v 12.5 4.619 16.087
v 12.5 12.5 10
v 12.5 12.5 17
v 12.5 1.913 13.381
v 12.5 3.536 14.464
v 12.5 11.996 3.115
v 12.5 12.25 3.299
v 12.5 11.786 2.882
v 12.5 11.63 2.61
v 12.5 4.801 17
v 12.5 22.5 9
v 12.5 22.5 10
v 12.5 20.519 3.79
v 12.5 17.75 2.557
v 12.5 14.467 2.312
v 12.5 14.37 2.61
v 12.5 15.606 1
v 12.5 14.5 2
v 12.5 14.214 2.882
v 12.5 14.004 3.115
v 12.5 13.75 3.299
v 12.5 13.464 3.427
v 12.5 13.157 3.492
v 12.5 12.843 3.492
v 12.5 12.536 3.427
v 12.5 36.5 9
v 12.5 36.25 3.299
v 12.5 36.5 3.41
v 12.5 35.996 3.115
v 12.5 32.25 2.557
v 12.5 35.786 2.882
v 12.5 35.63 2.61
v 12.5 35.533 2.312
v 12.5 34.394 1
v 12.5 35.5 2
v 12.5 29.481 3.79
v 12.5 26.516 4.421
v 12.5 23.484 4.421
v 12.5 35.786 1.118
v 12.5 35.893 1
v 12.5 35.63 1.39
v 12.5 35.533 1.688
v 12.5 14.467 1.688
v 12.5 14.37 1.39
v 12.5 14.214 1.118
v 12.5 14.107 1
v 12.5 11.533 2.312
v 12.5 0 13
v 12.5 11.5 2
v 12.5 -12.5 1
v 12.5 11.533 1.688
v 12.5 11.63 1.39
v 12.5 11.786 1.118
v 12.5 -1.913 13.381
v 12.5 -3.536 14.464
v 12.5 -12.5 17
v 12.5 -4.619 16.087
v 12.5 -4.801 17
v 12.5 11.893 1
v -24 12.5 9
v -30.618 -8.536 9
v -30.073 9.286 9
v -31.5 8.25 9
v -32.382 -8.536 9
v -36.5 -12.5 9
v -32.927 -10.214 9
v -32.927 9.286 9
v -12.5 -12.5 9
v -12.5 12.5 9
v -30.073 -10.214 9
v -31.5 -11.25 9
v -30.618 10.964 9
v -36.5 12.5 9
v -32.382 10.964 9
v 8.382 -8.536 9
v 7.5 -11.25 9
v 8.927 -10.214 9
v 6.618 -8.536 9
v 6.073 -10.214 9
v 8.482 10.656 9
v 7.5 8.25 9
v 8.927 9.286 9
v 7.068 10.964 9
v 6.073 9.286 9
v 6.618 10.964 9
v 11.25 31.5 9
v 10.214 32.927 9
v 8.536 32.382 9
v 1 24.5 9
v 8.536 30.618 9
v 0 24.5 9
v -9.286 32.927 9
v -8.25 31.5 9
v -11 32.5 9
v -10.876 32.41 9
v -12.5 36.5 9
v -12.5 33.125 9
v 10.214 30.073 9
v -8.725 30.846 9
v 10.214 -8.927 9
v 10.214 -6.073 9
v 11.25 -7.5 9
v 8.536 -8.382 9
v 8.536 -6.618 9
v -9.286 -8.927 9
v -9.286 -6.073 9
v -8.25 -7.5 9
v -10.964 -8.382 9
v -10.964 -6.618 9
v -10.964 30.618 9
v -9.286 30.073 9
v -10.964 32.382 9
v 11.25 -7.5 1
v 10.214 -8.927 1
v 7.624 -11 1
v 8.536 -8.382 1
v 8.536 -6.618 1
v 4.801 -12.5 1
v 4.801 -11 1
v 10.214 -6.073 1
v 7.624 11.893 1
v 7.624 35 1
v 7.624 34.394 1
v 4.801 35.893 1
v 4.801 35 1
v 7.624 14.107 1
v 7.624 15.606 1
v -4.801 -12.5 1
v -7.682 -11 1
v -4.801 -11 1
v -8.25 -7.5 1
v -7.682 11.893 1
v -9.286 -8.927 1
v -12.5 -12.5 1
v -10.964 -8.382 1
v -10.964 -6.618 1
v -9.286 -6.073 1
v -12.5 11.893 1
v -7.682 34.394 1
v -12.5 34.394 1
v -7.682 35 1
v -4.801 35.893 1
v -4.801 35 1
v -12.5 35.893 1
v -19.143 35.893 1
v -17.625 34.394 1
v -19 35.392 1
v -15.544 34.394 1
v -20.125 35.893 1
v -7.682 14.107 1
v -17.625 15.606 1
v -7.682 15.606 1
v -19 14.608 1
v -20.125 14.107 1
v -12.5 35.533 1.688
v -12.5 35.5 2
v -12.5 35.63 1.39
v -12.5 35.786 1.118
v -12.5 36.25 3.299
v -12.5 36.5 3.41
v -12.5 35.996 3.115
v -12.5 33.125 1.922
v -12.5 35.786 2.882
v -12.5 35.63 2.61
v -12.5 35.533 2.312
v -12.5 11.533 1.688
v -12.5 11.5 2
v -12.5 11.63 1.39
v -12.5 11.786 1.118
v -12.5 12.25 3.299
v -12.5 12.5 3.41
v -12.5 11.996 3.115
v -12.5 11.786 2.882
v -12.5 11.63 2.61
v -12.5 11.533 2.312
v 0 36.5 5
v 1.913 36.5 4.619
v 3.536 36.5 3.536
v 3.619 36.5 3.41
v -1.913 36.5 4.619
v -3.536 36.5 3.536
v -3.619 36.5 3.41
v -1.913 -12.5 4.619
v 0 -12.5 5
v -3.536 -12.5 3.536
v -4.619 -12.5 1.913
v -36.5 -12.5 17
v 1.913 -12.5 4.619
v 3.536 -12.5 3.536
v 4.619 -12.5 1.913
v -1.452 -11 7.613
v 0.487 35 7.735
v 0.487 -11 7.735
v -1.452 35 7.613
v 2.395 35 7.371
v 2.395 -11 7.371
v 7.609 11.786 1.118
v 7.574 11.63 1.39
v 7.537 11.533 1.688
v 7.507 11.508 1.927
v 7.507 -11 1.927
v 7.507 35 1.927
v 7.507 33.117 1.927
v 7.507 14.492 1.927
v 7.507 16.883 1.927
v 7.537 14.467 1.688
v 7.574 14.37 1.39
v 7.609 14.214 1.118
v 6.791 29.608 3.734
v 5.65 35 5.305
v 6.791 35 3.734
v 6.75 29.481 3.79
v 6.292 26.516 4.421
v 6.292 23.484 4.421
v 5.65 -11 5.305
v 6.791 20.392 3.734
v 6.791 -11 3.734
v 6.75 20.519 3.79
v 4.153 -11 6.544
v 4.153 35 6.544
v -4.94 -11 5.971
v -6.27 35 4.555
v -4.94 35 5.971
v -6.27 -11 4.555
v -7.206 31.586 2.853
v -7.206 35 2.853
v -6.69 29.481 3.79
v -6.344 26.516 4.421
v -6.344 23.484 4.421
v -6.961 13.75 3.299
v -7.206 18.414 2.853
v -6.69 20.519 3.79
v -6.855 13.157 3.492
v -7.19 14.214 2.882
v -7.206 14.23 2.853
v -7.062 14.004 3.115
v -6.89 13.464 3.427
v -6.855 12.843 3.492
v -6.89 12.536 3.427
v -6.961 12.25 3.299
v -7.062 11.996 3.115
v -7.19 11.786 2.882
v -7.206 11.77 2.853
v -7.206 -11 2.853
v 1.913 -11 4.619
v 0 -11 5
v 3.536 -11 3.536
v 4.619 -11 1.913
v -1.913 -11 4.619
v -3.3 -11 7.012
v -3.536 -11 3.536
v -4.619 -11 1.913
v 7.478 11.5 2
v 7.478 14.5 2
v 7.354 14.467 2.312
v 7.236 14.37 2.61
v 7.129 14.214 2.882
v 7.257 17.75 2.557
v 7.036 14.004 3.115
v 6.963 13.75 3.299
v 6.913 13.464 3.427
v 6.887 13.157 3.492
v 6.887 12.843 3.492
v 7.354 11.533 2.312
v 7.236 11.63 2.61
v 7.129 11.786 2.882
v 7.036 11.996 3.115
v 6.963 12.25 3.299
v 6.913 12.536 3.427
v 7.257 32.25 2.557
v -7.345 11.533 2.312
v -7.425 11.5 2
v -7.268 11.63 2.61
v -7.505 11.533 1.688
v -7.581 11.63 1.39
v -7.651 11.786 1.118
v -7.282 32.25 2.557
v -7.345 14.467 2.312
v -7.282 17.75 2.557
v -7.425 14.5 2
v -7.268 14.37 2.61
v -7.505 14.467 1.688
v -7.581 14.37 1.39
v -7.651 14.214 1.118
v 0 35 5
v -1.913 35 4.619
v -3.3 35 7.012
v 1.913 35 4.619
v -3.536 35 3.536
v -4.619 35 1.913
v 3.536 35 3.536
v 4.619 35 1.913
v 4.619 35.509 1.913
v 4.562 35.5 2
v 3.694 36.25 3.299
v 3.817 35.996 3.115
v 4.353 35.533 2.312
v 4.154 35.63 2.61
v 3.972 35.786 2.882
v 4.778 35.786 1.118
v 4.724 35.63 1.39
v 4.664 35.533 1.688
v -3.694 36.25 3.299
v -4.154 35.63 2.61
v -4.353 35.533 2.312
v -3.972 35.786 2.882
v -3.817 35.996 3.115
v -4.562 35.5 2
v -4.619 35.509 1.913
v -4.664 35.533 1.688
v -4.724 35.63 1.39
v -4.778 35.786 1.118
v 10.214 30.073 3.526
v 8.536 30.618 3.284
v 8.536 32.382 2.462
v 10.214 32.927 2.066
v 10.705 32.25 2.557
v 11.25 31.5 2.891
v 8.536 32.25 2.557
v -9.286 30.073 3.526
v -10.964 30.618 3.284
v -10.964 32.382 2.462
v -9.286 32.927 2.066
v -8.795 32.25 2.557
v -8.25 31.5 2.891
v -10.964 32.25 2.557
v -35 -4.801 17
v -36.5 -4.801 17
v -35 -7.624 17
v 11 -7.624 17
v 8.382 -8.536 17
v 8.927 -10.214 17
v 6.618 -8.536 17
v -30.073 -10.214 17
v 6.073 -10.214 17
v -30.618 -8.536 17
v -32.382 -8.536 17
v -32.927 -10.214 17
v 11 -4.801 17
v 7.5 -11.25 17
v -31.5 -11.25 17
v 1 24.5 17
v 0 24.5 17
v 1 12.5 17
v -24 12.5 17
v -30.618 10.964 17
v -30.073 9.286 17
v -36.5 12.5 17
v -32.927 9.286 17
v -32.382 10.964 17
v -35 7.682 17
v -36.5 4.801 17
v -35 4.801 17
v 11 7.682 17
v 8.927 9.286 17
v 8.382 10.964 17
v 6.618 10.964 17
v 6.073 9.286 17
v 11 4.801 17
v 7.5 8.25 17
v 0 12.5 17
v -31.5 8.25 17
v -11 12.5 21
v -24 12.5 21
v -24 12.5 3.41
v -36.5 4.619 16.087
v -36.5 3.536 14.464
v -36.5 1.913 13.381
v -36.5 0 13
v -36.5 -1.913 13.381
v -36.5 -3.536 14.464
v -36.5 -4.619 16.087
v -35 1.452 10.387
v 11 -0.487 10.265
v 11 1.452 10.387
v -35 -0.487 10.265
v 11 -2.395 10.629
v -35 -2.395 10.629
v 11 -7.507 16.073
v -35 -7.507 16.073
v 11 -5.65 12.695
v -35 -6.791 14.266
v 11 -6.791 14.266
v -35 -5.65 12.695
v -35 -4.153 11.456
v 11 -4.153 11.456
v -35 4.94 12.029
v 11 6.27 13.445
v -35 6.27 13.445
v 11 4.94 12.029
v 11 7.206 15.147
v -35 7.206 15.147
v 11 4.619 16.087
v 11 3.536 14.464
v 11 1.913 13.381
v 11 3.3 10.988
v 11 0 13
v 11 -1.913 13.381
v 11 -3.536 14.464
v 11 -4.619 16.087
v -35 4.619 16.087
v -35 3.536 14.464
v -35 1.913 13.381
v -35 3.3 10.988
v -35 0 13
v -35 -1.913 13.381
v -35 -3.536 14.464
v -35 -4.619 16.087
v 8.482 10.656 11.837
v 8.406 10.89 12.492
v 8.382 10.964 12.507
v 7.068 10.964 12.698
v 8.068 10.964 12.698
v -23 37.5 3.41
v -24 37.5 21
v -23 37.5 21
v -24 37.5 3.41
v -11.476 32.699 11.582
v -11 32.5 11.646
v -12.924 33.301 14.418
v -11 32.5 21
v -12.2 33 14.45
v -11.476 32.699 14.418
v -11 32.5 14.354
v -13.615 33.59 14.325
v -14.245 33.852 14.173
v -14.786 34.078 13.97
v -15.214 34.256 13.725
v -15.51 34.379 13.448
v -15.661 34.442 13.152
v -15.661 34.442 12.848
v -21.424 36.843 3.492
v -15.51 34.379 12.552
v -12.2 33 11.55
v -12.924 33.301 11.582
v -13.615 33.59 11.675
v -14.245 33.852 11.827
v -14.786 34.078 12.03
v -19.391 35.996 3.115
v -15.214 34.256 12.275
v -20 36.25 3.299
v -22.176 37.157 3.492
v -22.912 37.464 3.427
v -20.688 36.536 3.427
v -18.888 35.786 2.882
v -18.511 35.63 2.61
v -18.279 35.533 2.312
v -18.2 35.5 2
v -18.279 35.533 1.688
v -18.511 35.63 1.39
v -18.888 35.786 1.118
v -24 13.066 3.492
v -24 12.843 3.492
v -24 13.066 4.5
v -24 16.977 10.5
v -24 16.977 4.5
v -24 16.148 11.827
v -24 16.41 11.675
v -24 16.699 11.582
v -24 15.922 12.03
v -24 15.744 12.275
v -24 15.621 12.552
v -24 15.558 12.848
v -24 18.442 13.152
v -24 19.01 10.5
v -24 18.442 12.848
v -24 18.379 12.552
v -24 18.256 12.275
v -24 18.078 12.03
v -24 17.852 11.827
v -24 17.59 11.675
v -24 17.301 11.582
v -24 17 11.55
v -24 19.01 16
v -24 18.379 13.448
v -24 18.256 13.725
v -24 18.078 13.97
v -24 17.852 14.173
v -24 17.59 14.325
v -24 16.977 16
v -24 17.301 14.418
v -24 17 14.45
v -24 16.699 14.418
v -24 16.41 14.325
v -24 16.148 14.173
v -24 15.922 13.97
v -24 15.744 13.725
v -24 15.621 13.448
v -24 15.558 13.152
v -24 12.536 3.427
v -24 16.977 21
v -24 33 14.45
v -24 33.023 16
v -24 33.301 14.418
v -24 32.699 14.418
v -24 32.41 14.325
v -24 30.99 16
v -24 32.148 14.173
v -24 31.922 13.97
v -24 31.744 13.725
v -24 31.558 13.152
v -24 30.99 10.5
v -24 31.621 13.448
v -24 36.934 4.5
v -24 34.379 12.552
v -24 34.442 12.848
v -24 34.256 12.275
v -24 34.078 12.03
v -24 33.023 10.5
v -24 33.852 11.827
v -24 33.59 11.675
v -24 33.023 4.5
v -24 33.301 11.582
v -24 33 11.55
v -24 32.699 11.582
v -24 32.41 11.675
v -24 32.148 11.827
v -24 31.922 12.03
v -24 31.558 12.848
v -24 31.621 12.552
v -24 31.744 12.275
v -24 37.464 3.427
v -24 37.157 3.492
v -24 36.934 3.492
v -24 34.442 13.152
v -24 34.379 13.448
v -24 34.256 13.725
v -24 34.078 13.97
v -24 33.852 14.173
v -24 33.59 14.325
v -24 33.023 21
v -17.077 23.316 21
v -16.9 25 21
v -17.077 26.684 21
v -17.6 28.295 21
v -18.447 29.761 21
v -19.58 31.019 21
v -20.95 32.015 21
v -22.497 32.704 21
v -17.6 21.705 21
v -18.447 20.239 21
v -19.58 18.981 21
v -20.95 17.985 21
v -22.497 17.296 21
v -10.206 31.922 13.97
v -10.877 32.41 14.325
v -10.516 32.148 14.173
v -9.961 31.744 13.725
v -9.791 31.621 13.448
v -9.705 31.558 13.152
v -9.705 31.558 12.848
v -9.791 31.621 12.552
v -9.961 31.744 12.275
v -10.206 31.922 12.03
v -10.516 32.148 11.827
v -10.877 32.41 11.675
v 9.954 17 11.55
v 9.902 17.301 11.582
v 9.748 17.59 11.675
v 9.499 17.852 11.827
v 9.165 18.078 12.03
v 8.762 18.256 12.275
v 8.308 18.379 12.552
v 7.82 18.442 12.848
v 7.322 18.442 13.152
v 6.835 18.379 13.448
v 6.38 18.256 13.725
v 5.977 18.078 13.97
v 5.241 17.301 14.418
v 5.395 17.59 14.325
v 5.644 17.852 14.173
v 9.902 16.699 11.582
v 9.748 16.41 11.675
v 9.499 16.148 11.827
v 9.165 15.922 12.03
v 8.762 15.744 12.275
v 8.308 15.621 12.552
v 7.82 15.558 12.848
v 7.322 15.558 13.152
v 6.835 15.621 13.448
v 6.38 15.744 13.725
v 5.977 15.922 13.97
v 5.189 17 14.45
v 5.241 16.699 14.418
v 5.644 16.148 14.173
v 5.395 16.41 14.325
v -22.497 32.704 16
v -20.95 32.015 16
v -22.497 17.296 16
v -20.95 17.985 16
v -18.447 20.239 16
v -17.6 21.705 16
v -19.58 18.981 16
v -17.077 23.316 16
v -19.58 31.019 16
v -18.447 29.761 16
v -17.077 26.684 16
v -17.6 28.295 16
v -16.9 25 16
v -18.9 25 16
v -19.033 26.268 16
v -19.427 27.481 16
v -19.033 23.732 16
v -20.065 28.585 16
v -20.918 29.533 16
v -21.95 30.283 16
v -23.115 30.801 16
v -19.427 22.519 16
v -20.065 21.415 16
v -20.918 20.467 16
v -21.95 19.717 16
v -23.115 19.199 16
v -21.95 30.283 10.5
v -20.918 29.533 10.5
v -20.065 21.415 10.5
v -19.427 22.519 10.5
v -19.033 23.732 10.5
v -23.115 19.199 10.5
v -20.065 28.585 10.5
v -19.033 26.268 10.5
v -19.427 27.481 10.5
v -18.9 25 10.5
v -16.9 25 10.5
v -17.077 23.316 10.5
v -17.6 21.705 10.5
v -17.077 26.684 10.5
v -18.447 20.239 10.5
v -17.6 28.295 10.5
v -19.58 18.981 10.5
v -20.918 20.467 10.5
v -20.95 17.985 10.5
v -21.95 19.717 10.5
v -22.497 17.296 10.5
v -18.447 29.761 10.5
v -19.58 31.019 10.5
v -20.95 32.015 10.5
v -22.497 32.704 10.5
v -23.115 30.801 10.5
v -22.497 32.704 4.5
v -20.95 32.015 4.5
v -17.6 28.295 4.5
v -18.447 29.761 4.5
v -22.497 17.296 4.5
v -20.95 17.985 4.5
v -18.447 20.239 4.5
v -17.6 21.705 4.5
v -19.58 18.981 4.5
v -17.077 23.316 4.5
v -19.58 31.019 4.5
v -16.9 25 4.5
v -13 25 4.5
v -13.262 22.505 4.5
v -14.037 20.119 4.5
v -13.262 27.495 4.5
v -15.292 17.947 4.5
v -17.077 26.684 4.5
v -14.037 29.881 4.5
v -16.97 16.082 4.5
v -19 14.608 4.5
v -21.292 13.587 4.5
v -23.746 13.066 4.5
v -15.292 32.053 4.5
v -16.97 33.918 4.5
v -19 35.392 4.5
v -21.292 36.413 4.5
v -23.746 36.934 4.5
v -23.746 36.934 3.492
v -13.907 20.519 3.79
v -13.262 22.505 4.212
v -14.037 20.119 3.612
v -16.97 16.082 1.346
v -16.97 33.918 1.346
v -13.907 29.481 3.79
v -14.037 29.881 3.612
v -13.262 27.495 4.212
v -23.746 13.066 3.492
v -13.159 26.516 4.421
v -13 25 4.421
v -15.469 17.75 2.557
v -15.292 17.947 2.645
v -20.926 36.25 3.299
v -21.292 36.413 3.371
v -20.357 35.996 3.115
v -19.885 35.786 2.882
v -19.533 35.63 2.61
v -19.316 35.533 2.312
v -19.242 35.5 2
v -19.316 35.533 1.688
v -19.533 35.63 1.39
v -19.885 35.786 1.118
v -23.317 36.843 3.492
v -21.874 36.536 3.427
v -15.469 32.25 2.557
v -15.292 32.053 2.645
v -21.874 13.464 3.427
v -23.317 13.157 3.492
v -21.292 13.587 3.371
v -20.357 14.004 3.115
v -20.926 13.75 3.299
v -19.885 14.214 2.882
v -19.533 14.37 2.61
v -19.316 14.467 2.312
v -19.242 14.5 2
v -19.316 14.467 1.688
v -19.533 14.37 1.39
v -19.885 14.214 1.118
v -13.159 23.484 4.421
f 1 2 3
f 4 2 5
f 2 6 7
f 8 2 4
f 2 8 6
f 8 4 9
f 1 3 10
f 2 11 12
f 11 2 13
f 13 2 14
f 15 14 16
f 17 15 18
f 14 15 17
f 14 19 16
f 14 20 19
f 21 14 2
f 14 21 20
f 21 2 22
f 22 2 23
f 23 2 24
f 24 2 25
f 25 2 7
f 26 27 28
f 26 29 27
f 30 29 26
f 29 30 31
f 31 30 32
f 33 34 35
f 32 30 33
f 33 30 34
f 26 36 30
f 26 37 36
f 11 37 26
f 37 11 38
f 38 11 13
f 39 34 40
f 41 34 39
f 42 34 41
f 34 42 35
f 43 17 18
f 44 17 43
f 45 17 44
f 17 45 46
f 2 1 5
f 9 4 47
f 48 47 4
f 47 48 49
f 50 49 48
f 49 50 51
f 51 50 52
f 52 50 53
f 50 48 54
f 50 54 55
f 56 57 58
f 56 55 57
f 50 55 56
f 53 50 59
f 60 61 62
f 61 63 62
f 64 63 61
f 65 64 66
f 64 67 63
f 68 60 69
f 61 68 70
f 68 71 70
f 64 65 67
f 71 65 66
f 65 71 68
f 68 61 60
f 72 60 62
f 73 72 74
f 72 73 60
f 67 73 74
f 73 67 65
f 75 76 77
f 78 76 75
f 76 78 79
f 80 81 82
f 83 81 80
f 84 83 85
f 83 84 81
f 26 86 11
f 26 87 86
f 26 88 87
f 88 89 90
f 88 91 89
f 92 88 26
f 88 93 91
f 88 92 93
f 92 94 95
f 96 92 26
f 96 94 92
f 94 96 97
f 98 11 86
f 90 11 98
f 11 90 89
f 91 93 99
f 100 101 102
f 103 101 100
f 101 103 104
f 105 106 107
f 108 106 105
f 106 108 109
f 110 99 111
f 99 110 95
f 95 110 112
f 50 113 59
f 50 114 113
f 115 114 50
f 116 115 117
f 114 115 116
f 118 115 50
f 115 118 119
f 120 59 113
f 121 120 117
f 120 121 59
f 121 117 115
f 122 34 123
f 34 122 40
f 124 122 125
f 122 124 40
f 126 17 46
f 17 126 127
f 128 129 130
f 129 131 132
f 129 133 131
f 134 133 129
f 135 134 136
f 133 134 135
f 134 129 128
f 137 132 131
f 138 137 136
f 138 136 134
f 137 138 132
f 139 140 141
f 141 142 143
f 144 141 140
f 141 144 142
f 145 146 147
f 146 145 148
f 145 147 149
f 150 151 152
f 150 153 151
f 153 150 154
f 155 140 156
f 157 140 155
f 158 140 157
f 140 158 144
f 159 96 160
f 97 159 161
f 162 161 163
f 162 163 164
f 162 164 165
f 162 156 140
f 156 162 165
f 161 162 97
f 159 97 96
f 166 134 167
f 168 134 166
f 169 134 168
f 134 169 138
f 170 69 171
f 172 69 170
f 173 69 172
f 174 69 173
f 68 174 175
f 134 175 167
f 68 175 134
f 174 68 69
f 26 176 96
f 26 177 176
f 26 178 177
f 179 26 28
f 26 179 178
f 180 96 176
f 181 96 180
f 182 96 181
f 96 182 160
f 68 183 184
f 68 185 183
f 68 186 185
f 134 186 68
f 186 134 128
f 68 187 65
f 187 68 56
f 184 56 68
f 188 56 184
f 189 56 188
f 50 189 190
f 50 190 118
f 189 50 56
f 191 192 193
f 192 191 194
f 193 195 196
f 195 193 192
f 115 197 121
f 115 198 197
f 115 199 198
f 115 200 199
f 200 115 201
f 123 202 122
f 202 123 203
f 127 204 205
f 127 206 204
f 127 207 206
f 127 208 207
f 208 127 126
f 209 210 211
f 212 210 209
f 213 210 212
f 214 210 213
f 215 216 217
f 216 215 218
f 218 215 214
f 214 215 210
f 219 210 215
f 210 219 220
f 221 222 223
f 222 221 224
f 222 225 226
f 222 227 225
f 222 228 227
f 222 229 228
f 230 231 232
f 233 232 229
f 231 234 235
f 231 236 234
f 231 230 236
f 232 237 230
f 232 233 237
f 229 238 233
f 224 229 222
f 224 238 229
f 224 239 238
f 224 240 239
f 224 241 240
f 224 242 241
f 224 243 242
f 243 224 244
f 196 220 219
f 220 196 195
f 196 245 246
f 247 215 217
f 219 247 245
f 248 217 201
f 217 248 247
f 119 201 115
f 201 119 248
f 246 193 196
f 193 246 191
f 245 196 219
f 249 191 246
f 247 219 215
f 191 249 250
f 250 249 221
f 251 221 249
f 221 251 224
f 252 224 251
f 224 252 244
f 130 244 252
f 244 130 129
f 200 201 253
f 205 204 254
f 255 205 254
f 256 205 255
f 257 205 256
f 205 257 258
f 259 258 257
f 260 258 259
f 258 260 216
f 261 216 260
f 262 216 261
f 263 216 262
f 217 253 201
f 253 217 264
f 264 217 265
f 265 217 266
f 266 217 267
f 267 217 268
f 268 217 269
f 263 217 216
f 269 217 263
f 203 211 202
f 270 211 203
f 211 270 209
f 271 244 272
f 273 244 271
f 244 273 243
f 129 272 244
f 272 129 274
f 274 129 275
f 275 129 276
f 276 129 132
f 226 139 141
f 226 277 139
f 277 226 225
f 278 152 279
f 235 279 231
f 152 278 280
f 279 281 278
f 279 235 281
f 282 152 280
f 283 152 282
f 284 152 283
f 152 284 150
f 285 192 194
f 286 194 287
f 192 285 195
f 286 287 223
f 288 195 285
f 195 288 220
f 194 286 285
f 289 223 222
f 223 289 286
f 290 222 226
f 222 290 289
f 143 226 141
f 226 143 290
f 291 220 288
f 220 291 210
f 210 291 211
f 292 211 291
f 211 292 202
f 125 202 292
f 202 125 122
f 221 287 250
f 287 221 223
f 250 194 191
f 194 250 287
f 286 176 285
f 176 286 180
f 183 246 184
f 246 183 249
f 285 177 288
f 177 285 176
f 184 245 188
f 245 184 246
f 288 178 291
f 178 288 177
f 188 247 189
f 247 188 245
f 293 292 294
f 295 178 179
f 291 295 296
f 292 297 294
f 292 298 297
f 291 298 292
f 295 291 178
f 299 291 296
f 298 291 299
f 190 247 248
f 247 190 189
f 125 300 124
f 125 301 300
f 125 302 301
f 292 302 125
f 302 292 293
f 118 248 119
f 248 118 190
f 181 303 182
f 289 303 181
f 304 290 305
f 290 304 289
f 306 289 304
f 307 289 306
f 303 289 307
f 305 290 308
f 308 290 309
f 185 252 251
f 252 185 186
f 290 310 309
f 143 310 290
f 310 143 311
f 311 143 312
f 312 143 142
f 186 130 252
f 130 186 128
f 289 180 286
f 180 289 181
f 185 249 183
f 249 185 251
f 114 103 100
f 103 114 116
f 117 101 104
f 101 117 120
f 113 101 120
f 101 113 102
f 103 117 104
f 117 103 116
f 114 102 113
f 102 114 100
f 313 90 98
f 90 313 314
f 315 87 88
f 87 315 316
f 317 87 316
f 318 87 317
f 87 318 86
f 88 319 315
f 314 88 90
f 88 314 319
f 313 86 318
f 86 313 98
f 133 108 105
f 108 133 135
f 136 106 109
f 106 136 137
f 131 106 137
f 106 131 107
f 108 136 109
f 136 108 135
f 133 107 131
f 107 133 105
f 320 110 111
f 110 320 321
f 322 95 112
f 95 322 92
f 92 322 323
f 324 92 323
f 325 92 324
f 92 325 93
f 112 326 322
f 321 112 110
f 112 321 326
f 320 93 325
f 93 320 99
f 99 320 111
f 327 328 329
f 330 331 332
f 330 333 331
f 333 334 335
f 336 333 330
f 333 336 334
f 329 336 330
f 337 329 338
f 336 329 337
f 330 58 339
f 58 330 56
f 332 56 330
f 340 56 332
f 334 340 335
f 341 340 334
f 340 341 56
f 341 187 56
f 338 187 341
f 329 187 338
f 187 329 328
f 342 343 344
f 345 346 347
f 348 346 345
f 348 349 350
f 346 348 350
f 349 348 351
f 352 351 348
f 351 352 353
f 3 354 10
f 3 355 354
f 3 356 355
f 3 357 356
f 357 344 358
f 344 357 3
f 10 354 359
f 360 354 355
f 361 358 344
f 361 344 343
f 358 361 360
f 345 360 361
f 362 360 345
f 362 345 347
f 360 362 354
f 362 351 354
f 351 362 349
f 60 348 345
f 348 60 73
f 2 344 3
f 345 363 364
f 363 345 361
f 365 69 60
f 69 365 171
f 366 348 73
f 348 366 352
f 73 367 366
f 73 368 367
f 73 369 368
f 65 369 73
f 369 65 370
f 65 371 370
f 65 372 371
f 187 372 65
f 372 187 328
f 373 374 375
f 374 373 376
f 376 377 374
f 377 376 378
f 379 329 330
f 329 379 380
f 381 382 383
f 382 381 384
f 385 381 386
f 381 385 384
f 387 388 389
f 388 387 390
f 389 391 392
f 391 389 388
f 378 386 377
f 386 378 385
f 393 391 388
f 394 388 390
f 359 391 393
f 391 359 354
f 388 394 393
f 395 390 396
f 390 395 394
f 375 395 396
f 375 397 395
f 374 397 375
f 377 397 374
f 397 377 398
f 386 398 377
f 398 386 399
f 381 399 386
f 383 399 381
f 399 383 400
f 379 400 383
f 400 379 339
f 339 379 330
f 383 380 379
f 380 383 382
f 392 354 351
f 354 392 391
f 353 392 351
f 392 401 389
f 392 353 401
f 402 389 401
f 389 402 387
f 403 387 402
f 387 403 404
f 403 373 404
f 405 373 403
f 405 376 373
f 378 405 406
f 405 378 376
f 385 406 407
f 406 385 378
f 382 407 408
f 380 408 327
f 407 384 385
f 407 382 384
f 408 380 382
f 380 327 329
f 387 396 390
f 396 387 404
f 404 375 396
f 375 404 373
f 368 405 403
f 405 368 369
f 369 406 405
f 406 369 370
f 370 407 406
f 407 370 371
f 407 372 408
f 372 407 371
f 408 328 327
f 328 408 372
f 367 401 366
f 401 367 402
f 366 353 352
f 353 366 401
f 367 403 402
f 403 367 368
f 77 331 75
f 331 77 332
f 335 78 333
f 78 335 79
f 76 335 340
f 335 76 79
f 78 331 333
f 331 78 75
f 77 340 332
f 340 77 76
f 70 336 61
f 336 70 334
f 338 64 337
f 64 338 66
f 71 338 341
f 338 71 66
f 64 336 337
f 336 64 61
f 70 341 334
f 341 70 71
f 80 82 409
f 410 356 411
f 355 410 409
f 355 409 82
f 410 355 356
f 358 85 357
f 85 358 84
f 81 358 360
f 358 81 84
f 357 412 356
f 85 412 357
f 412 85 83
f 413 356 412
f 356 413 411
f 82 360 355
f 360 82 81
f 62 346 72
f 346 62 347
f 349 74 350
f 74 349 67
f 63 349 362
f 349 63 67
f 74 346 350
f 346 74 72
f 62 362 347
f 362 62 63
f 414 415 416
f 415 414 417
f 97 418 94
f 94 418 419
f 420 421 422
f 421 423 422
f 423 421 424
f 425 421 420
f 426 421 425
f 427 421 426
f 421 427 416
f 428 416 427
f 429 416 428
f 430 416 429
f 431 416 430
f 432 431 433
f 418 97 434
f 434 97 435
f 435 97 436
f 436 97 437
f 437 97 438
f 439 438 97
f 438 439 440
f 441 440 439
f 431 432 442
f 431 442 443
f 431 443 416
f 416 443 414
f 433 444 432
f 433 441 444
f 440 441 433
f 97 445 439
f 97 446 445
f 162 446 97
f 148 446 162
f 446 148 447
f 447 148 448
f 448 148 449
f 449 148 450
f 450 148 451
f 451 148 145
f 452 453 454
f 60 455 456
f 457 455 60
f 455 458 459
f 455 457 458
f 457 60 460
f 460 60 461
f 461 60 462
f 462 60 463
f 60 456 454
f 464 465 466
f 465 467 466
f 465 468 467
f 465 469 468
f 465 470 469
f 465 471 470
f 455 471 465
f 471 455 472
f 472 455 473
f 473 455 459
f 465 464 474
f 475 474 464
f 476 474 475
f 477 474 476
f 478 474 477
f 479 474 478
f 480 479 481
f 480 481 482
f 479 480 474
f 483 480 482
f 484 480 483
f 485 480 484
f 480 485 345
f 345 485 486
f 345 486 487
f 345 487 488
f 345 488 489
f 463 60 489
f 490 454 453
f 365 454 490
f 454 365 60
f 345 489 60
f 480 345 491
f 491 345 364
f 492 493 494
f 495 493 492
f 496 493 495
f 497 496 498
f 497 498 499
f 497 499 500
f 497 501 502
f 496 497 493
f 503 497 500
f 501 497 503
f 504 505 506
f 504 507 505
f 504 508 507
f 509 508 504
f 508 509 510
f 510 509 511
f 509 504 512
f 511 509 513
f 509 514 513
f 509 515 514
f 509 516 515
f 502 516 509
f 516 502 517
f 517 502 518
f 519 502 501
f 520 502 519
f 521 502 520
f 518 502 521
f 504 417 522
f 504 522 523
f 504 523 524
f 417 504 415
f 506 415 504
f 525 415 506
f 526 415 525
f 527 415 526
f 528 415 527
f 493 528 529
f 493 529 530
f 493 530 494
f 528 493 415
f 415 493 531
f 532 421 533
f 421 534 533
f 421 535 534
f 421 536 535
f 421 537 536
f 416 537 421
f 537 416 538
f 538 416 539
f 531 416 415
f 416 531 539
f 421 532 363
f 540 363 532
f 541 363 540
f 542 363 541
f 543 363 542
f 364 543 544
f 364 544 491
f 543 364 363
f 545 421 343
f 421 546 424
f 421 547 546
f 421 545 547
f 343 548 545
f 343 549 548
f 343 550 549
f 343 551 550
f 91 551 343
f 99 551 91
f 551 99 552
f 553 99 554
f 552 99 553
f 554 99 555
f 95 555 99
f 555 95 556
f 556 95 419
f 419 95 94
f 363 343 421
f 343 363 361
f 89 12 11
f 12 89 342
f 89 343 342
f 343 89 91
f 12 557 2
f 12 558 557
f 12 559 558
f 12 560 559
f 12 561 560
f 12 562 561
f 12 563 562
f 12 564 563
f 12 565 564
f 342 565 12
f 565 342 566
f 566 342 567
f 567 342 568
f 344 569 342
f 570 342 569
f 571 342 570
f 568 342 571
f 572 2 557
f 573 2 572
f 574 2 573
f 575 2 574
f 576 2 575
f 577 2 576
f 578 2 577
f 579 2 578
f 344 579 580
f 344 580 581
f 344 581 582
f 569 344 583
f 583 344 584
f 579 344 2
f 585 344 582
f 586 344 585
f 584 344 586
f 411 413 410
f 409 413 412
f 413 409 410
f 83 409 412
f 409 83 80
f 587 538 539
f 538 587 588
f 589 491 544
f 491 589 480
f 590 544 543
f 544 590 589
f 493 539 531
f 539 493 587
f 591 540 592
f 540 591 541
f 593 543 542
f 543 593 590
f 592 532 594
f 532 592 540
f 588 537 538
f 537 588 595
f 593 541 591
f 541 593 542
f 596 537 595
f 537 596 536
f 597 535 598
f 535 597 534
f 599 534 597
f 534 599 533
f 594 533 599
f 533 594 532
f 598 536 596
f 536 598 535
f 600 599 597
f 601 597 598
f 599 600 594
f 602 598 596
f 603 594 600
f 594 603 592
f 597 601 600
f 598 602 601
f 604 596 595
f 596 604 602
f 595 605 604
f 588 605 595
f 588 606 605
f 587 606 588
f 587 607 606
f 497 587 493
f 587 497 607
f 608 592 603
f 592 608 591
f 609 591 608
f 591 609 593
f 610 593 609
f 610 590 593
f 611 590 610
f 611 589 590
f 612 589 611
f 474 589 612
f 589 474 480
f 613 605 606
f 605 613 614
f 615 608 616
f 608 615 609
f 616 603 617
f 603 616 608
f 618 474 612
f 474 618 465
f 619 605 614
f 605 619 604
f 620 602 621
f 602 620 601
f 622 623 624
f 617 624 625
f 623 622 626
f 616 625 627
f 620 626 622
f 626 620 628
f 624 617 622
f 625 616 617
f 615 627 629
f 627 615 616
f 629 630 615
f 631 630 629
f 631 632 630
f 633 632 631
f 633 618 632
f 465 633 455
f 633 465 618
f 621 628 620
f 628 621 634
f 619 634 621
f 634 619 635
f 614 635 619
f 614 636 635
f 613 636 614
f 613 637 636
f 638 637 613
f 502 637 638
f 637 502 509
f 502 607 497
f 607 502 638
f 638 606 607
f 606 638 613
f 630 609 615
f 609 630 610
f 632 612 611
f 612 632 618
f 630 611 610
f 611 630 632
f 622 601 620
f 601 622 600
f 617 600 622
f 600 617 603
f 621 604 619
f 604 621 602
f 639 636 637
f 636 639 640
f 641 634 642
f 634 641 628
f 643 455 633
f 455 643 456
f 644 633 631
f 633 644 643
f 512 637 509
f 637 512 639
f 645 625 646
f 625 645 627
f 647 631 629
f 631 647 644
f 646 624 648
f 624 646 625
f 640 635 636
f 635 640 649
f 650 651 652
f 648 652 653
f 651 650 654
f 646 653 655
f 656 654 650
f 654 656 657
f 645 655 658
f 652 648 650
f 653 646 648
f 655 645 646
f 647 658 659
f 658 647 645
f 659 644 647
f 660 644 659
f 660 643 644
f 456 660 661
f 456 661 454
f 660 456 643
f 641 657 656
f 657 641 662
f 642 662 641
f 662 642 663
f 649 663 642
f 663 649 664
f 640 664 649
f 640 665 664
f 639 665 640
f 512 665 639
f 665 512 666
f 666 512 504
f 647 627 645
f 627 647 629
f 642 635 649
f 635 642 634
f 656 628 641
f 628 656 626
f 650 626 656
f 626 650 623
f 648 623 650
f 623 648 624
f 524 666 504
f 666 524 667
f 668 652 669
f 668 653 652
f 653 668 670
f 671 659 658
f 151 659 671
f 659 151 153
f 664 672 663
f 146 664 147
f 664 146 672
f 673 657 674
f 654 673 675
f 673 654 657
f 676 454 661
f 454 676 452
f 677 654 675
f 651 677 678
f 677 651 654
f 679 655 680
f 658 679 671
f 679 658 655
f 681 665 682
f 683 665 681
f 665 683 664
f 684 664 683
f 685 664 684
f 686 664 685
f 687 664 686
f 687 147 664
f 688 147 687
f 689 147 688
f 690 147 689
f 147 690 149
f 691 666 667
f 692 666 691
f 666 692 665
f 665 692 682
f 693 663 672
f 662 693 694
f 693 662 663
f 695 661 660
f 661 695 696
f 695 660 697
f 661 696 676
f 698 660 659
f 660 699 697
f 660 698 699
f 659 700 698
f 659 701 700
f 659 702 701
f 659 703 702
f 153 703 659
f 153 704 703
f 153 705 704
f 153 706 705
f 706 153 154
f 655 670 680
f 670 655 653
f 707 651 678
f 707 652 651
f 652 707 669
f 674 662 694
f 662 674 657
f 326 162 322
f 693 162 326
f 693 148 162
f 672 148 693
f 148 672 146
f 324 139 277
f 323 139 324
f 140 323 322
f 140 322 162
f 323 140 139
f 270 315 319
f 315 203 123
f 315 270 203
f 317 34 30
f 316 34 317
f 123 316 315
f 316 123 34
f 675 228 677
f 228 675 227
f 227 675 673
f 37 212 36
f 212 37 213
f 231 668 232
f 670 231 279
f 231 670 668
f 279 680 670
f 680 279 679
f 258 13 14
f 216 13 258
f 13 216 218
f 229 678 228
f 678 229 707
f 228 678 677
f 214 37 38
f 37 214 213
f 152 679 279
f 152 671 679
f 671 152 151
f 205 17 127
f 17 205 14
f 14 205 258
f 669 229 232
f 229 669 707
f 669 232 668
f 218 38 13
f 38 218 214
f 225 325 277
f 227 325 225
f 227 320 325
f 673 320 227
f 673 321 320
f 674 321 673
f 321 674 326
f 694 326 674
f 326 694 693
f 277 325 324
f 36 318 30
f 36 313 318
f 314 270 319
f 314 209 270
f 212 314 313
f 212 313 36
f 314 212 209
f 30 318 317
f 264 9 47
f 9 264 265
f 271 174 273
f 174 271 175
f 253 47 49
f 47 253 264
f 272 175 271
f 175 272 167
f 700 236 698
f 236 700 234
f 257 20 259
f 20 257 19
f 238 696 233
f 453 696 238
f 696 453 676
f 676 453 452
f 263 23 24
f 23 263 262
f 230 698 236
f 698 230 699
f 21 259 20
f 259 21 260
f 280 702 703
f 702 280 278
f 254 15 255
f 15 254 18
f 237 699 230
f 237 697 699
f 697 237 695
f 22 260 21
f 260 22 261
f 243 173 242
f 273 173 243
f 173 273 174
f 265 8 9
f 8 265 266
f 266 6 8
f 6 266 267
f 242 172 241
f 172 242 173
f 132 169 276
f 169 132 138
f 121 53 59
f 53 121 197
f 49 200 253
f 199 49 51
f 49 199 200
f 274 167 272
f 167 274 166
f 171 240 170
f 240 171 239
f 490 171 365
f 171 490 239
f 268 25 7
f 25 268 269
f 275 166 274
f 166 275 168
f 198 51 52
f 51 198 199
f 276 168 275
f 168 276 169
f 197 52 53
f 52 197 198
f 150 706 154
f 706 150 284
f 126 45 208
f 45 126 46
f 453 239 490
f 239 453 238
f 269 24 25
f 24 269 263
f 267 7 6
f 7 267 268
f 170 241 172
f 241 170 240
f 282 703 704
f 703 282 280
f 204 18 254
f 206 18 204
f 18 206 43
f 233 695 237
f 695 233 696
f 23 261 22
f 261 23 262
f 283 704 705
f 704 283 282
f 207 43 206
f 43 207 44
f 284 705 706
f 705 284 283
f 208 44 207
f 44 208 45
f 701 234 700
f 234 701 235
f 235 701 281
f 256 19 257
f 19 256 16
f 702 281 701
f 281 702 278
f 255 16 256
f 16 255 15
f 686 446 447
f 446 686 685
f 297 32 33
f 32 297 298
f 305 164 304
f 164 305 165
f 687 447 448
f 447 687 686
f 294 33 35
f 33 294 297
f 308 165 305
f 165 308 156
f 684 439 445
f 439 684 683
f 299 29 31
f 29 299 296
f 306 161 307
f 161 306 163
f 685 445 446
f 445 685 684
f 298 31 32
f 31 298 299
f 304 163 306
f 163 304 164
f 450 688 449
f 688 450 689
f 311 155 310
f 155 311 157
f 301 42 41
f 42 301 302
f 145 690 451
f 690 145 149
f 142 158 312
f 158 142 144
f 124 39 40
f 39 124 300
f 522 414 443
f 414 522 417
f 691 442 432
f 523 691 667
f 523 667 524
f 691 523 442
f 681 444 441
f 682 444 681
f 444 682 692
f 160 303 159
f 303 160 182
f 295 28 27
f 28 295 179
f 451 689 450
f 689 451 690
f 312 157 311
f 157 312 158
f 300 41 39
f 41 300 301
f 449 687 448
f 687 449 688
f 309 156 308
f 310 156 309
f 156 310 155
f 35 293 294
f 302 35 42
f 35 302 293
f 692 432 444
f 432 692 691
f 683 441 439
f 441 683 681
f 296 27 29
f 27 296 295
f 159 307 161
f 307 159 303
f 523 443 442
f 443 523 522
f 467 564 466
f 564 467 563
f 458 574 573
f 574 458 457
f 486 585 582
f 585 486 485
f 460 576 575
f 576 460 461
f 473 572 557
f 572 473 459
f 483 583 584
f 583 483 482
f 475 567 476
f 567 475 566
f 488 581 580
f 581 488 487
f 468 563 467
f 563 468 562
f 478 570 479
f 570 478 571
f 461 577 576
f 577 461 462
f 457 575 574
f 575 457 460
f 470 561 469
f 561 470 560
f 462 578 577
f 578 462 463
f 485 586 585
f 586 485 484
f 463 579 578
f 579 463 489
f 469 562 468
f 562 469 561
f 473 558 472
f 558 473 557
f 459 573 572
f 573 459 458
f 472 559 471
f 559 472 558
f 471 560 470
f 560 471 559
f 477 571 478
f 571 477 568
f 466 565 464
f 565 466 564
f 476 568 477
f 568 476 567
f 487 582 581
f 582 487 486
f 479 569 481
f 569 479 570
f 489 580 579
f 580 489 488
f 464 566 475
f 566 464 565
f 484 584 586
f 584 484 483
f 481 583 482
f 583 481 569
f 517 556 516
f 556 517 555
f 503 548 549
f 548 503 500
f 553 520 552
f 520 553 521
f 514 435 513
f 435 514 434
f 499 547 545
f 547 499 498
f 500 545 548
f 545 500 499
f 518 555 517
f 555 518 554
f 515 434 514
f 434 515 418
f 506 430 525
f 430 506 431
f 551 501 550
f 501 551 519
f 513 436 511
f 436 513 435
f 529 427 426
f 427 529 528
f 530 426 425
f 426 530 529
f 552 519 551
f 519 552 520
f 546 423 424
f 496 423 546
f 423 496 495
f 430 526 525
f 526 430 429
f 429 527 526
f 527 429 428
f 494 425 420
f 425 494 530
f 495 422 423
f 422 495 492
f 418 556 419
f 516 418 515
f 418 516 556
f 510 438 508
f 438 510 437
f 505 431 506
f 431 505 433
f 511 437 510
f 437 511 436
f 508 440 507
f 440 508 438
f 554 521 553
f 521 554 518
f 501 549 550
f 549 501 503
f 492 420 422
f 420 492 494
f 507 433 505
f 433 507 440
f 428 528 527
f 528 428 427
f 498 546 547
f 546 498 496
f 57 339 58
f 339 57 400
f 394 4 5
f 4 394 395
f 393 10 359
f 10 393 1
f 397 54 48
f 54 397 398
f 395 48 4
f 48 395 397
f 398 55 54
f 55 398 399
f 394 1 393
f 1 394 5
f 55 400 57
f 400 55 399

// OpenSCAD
cross_rod_spaceing = 18;
cross_rod_diameter = 8;
//cross_rod_holder_diameter = 12.1;
bearing_diameter = 15.3;
bearing_length = 19*2;
bearing_wall = 3;
rod_block = bearing_diameter+bearing_wall*2;


fn = 30; // resolution of cylinders

// small extruder coolingfan
ex_fan_xy = 31;
ex_fan_h = 8;
ex_fan_space = 50/2;
ex_fan_hole_dist = 24;

cube_x = 19*2 +4;
cube_y = rod_block+8+ex_fan_xy/2;
cube_z = 18+12+4 +30 +bearing_diameter/2 -4;
// Larger print cooling fan

pr_fan_xy = 40;
pr_fan_h = 10;
pr_fan_space = 25/2;
pr_fan_hole_dist = 24;


ex_height = 6; //Height of extrudermount relative to lower rod
ex_x = bearing_diameter/2+bearing_wall+8;
ex_y = bearing_diameter/2+bearing_wall+8;
// not visible helping parts
//Rods
%translate([0,100,0]) rotate([90,0,0]) cylinder(d=cross_rod_diameter, h= 200, $fn=fn);
%translate([-100,0,cross_rod_spaceing]) rotate([0,90,0]) cylinder(d=cross_rod_diameter, h= 200, $fn=fn);
// Bearings
//%translate([0,0,cross_rod_spaceing]) rotate([0,90,0]) color("green") cylinder(d=bearing_diameter, h= bearing_length+2, $fn=fn);
//%translate([0,bearing_length-bearing_diameter/2-bearing_wall+1,0]) rotate([90,0,0]) color("cyan") cylinder(d=bearing_diameter, h= bearing_length+2, $fn=fn);


//%e3d();
//%ex_fan();
//%e3d_cut();

//%translate([ex_x,-10,-52]) rotate([0,0,-90]) import("RightLongDuct.STL", convexity=10);


//Main block
//main_block();

new_block();

//bearing_holder();
// fastening clamp
//klamma();
//half_bearing();

module main_block() {
    difference() {
        union() {
            difference() {
                union() {
                translate([-bearing_diameter/2-bearing_wall,-bearing_diameter/2-bearing_wall,-cube_z+cross_rod_spaceing+bearing_diameter/2+bearing_wall]) cube([cube_x,cube_y,cube_z]);
                     
                }
            
                translate([ex_x,ex_y,ex_height]) %e3d();
                translate([ex_x,ex_y,ex_height])  e3d_cut();
            
                // bearing holes
                translate([-100,0,cross_rod_spaceing]) rotate([0,90,0]) color("green") cylinder(d=bearing_diameter, h= 200, $fn=fn);
                translate([0,50,0]) rotate([90,0,0]) color("cyan") cylinder(d=bearing_diameter, h= 200, $fn=fn);
                
                //fan mount
                translate([10,50,-13]) rotate([90,0,0]) color("cyan") cylinder(d=3, h= 200, $fn=fn);
                //Material saving
                translate([-50,-20,bearing_diameter/2+bearing_wall]) cube([100,100,50]);
                translate([-50,-50+ex_y-ex_fan_xy/2,-58]) cube([100,50,50]);
                translate([ex_x,-20,-50+ex_height+2]) cube([100,100,100]);
            }
            translate([-rod_block/2,-18,-rod_block/2-cross_rod_spaceing]) cube([bearing_length,rod_block,rod_block]);
        }
        // bearing holes
        translate([-100,-18+rod_block/2,-cross_rod_spaceing]) rotate([0,90,0]) color("green") cylinder(d=bearing_diameter, h= 200, $fn=fn);
        translate([0,50,0]) rotate([90,0,0]) color("cyan") cylinder(d=bearing_diameter, h= 200, $fn=fn);
    }
}



module klamma() {
    difference() {
        cube([10.5, 25, 14]) ;
        translate([11 , 25/2 , 14])  e3d_cut();
    }
}

module ex_fan() {
    //extruder fan
    
    cube([ex_fan_xy,ex_fan_h,ex_fan_xy]);
}

//translate([-bearing_diameter/2-bearing_wall,ex_y,0]) rotate([0,0,90])%pr_fan();
module pr_fan() {
    //printer fan
    
    translate([-pr_fan_xy/2,0,-pr_fan_xy/2]) cube([pr_fan_xy,pr_fan_h,pr_fan_xy]);
}

module fan_slot() {
    // surface area of motor core 380mm^2
    // surface area of fanblades ~700mm^2
    
}

module e3d() {
    c1_d = 16.2;
    c1_h = 4; // 3.7
    c2_d = 12.2;
    c2_h = 6;
    c3_d = 16.2;
    c3_h = 3;
    c4_d = 12;
    c4_h = 1.5;
    c5_d = 16.2;
    c5_h = 1;
    c6_d = 12;
    c6_h = 1.5;
    c7_d = 24;
    c7_h = 26.5;
    
    c_total_h = c1_h+c2_h+c3_h+c4_h+c5_h+c6_h+c7_h;
    total_h = 63; // Total length of the e3d
    
    block_x = 20;
    block_y = 16;
    block_z = 12;
    
    nozle_d = 10;
    nozle_h = 5;
    
    rotate([180,0,0])union() {
        translate([0,0,0]) cylinder(d=c1_d, h = c1_h, $fn=fn);
        translate([0,0,c1_h]) cylinder(d=c2_d, h = c2_h, $fn=fn);
        translate([0,0,c1_h+c2_h]) cylinder(d=c3_d, h = c3_h, $fn=fn);
        translate([0,0,c1_h+c2_h+c3_h]) cylinder(d=c4_d, h = c4_h, $fn=fn);
        translate([0,0,c1_h+c2_h+c3_h+c4_h]) cylinder(d=c5_d, h = c5_h, $fn=fn);
        translate([0,0,c1_h+c2_h+c3_h+c4_h+c5_h]) cylinder(d=c6_d, h = c6_h, $fn=fn);
        translate([0,0,c1_h+c2_h+c3_h+c4_h+c5_h+c6_h]) cylinder(d=c7_d, h = c7_h, $fn=fn);
        translate([-4.5,-block_y/2,total_h-nozle_h-block_z]) cube([block_x,block_y,block_z]);
        translate([0,0,total_h-nozle_h]) cylinder(d=nozle_d, h = nozle_h, $fn=fn);
    }
}

module e3d_cut() {
    
        e3d_cut_extruder_hull();
        
    
    //translate([0,-0,0]) ex_fan();
    translate([0,0,-4-6-8-13 +1]) rotate([0,0,90]) fan_cut();
    
    // mount cut
    mount_hole_dist = 16;
    translate([-50 , mount_hole_dist/2 , -7 ]) rotate([0,90,0])cylinder(d=2.9, h = 100, $fn=fn);
    translate([-50 , -mount_hole_dist/2 , -7 ]) rotate([0,90,0])cylinder(d=2.9, h = 100, $fn=fn);
}

module fan_cut() {
    
    hull() {
        //translate([-ex_fan_xy/2,ex_fan_space,-ex_fan_xy/2]) ex_fan();
        translate([-ex_fan_xy/2,50+ex_fan_space,-ex_fan_xy/2]) ex_fan();
    }
    hull() {
        translate([-ex_fan_xy/2,-ex_fan_space-ex_fan_h,-ex_fan_xy/2]) ex_fan();
        translate([-ex_fan_xy/2,-50-ex_fan_space-ex_fan_h,-ex_fan_xy/2]) ex_fan();
    }
    translate([0,50,0]) rotate([90,0,0])cylinder(d=ex_fan_xy-2, h = 100, $fn=fn);
    //ex_fan_hole_dist
    // screw mount for fan
    translate([ex_fan_hole_dist/2,50,ex_fan_hole_dist/2]) rotate([90,0,0])cylinder(d=3, h = 100, $fn=fn);
    translate([ex_fan_hole_dist/2,50,-ex_fan_hole_dist/2]) rotate([90,0,0])cylinder(d=3, h = 100, $fn=fn);
    translate([-ex_fan_hole_dist/2,50,ex_fan_hole_dist/2]) rotate([90,0,0])cylinder(d=3, h = 100, $fn=fn);
    translate([-ex_fan_hole_dist/2,50,-ex_fan_hole_dist/2]) rotate([90,0,0])cylinder(d=3, h = 100, $fn=fn);
}
module e3d_cut_extruder() {
    c1_d = 16.2;
    c1_h = 4; // 3.7
    c2_d = 12.2;
    c2_h = 6;
    c3_d = 16.2;
    c3_h = 6;
    c4_d = 24;
    c4_h = 28;
    
    c_total_h = c1_h+c2_h+c3_h+c4_h;
    total_h = 63; // Total length of the e3d
    
    block_x = 20;
    block_y = 16;
    block_z = 12;
    
    nozle_d = 10;
    nozle_h = 5;
    
    rotate([180,0,0])union() {
        translate([0,0,-200]) cylinder(d=c1_d, h = 200, $fn=fn);
        
        translate([0,0,0]) cylinder(d=c1_d, h = c1_h, $fn=fn);
        translate([0,0,c1_h]) cylinder(d=c2_d, h = c2_h, $fn=fn);
        translate([0,0,c1_h+c2_h]) cylinder(d=c3_d, h = c3_h, $fn=fn);
        translate([0,0,c1_h+c2_h+c3_h]) cylinder(d=c4_d, h = c4_h, $fn=fn);
        
        
    }
}
module e3d_cut_extruder_hull() {
    c1_d = 16.2;
    c1_h = 4; // 3.7
    c2_d = 12.2;
    c2_h = 5.5;
    c3_d = 16.2;
    c3_h = 6;
    c4_d = 24;
    c4_h = 28;
    
    c_total_h = c1_h+c2_h+c3_h+c4_h;
    total_h = 63; // Total length of the e3d
    
    block_x = 20;
    block_y = 16;
    block_z = 12;
    
    nozle_d = 10;
    nozle_h = 5;
    
    rotate([180,0,0])union() {
        hull() {
            translate([0,0,-200]) cylinder(d=c1_d, h = 200, $fn=fn);
            translate([50,0,0]) translate([0,0,-200]) cylinder(d=c1_d, h = 200, $fn=fn);
        }
        hull() {
            translate([0,0,0]) cylinder(d=c1_d, h = c1_h, $fn=fn);
            translate([50,0,0]) translate([0,0,0]) cylinder(d=c1_d, h = c1_h, $fn=fn);
        }
        hull() {
            translate([0,0,c1_h]) cylinder(d=c2_d, h = c2_h, $fn=fn);
            translate([50,0,0]) translate([0,0,c1_h]) cylinder(d=c2_d, h = c2_h, $fn=fn);
        }
        hull() {
            translate([0,0,c1_h+c2_h]) cylinder(d=c3_d, h = c3_h, $fn=fn);
            translate([50,0,0]) translate([0,0,c1_h+c2_h]) cylinder(d=c3_d, h = c3_h, $fn=fn);
        }
        hull() {
            translate([0,0,c1_h+c2_h+c3_h]) cylinder(d=c4_d, h = c4_h, $fn=fn);
            translate([50,0,0]) translate([0,0,c1_h+c2_h+c3_h]) cylinder(d=c4_d, h = c4_h, $fn=fn);
        }
        
        
        
    }
}
%half_bearing();
module half_bearing(length = 30) {
    l = 30;
    w = 2*2;
    d1 = 15;
    rod = 8;
    fins = 10;
    fin_w =2;
    
    
    rotate([-90,0,0]) difference() {
        union() {
            tube(od=d1, id=d1-w, length=l);
            for (a =[0:360/fins:360]) {
                rotate([0,0,a]) translate([rod/2,-fin_w/2,0]) cube([d1/2-rod/2-1, fin_w, l]);
            
            }
        }
        translate([-d1/2,-1.1,-1]) cube([d1+2, d1+2, l+2]);
        cylinder(d1=rod+2, d2=rod, h=1);
        translate([0,0,l-1]) cylinder(d2=rod+2, d1=rod, h=1);
        
        //oil hole
        translate([0,0,l/2]) rotate([90,0,0])  cylinder(d=2, h=d1);
    }
    
}
module tube(od=10, id=5, length = 10) {
    difference() {
        union() {
            cylinder(d=od, h=length);
            
        }
        translate([0,0,-1]) cylinder(d=id, h=length+2);
        
    }
    
}

translate([0,-25/2,0 ]) rotate([0,180,0]) color("red") % bearing_holder(length = 45);
 translate([25/2,-0,0 ])color("red") translate([0,0,cross_rod_spaceing])rotate([180,0,0]) rotate([0,0,90]) rotate([0,180,0]) %bearing_holder(length = 45);
module bearing_holder(length = 30, screw_d = 3) {
    holder_x = 25;
    difference() {
        union() {
            translate([-holder_x/2,0,1]) cube([holder_x,2+length+2, 8]);
        }
        translate([0,1.5,0]) rotate([-90,0,0]) cylinder(d=15.5, h=length+1);
        translate([0,-1,0]) rotate([-90,0,0]) cylinder(d=10, h=length+30);
        
        // mounting screw holes
        translate([15.5/2+2, 5 ,0]) cylinder(d=screw_d, h=40);
        translate([15.5/2+2, length+4-5 ,0]) cylinder(d=screw_d, h=40);
        translate([-15.5/2-2, 5 ,0]) cylinder(d=screw_d, h=40);
        translate([-15.5/2-2, length+4-5 ,0]) cylinder(d=screw_d, h=40);
    }
    
}

module new_block() {
    //cross_rod_spaceing
    bearing_l = 45;
    
    difference() {
        union() {
            translate([0,-25/2,0 ]) bearing_holder(length = bearing_l);
            translate([25/2,0,cross_rod_spaceing]) rotate([0,0,90]) rotate([0,180,0]) bearing_holder(length = bearing_l);
            hull(){
                translate([-24,25/2,1]) cube([1,25,20]) ;
                translate([-24+12,25/2,1]) cube([1,20,20]) ;
            }
            hull(){
                translate([-24+12,25/2,1+8]) cube([1,20,20-8]) ;
                translate([-24+12+11,25/2,1+8]) cube([1,20-8,20-8-4]) ;
            }
            hull(){
                translate([-24+12+11+1,25/2,1+8]) cube([1,20-8,20-8-4]);
                translate([0+25/2-1,10,1+8]) cube([1, 25/2, 1]);
                
            }
            
        }
        //translate([0,1.5,0]) rotate([-90,0,0]) cylinder(d=15.5, h=bearing_l+1);
        translate([-25,25,20]) rotate([0,0,180])  e3d_cut();
        //hål runt stången
        translate([25,0,cross_rod_spaceing]) rotate([0,-90,0]) cylinder(d=10, h=50);
    }
    
    translate([-25,25,20]) %e3d();
    //%e3d_cut();cube([11, 25, 12]) ;
    translate([-25,25,20]) translate([-11,-25/2,-14]) %klamma();
    %translate([0,2,0]) half_bearing(length=bearing_l);
    %translate([0,2,0]) rotate([0,180,0]) half_bearing(length=bearing_l);
    
}
